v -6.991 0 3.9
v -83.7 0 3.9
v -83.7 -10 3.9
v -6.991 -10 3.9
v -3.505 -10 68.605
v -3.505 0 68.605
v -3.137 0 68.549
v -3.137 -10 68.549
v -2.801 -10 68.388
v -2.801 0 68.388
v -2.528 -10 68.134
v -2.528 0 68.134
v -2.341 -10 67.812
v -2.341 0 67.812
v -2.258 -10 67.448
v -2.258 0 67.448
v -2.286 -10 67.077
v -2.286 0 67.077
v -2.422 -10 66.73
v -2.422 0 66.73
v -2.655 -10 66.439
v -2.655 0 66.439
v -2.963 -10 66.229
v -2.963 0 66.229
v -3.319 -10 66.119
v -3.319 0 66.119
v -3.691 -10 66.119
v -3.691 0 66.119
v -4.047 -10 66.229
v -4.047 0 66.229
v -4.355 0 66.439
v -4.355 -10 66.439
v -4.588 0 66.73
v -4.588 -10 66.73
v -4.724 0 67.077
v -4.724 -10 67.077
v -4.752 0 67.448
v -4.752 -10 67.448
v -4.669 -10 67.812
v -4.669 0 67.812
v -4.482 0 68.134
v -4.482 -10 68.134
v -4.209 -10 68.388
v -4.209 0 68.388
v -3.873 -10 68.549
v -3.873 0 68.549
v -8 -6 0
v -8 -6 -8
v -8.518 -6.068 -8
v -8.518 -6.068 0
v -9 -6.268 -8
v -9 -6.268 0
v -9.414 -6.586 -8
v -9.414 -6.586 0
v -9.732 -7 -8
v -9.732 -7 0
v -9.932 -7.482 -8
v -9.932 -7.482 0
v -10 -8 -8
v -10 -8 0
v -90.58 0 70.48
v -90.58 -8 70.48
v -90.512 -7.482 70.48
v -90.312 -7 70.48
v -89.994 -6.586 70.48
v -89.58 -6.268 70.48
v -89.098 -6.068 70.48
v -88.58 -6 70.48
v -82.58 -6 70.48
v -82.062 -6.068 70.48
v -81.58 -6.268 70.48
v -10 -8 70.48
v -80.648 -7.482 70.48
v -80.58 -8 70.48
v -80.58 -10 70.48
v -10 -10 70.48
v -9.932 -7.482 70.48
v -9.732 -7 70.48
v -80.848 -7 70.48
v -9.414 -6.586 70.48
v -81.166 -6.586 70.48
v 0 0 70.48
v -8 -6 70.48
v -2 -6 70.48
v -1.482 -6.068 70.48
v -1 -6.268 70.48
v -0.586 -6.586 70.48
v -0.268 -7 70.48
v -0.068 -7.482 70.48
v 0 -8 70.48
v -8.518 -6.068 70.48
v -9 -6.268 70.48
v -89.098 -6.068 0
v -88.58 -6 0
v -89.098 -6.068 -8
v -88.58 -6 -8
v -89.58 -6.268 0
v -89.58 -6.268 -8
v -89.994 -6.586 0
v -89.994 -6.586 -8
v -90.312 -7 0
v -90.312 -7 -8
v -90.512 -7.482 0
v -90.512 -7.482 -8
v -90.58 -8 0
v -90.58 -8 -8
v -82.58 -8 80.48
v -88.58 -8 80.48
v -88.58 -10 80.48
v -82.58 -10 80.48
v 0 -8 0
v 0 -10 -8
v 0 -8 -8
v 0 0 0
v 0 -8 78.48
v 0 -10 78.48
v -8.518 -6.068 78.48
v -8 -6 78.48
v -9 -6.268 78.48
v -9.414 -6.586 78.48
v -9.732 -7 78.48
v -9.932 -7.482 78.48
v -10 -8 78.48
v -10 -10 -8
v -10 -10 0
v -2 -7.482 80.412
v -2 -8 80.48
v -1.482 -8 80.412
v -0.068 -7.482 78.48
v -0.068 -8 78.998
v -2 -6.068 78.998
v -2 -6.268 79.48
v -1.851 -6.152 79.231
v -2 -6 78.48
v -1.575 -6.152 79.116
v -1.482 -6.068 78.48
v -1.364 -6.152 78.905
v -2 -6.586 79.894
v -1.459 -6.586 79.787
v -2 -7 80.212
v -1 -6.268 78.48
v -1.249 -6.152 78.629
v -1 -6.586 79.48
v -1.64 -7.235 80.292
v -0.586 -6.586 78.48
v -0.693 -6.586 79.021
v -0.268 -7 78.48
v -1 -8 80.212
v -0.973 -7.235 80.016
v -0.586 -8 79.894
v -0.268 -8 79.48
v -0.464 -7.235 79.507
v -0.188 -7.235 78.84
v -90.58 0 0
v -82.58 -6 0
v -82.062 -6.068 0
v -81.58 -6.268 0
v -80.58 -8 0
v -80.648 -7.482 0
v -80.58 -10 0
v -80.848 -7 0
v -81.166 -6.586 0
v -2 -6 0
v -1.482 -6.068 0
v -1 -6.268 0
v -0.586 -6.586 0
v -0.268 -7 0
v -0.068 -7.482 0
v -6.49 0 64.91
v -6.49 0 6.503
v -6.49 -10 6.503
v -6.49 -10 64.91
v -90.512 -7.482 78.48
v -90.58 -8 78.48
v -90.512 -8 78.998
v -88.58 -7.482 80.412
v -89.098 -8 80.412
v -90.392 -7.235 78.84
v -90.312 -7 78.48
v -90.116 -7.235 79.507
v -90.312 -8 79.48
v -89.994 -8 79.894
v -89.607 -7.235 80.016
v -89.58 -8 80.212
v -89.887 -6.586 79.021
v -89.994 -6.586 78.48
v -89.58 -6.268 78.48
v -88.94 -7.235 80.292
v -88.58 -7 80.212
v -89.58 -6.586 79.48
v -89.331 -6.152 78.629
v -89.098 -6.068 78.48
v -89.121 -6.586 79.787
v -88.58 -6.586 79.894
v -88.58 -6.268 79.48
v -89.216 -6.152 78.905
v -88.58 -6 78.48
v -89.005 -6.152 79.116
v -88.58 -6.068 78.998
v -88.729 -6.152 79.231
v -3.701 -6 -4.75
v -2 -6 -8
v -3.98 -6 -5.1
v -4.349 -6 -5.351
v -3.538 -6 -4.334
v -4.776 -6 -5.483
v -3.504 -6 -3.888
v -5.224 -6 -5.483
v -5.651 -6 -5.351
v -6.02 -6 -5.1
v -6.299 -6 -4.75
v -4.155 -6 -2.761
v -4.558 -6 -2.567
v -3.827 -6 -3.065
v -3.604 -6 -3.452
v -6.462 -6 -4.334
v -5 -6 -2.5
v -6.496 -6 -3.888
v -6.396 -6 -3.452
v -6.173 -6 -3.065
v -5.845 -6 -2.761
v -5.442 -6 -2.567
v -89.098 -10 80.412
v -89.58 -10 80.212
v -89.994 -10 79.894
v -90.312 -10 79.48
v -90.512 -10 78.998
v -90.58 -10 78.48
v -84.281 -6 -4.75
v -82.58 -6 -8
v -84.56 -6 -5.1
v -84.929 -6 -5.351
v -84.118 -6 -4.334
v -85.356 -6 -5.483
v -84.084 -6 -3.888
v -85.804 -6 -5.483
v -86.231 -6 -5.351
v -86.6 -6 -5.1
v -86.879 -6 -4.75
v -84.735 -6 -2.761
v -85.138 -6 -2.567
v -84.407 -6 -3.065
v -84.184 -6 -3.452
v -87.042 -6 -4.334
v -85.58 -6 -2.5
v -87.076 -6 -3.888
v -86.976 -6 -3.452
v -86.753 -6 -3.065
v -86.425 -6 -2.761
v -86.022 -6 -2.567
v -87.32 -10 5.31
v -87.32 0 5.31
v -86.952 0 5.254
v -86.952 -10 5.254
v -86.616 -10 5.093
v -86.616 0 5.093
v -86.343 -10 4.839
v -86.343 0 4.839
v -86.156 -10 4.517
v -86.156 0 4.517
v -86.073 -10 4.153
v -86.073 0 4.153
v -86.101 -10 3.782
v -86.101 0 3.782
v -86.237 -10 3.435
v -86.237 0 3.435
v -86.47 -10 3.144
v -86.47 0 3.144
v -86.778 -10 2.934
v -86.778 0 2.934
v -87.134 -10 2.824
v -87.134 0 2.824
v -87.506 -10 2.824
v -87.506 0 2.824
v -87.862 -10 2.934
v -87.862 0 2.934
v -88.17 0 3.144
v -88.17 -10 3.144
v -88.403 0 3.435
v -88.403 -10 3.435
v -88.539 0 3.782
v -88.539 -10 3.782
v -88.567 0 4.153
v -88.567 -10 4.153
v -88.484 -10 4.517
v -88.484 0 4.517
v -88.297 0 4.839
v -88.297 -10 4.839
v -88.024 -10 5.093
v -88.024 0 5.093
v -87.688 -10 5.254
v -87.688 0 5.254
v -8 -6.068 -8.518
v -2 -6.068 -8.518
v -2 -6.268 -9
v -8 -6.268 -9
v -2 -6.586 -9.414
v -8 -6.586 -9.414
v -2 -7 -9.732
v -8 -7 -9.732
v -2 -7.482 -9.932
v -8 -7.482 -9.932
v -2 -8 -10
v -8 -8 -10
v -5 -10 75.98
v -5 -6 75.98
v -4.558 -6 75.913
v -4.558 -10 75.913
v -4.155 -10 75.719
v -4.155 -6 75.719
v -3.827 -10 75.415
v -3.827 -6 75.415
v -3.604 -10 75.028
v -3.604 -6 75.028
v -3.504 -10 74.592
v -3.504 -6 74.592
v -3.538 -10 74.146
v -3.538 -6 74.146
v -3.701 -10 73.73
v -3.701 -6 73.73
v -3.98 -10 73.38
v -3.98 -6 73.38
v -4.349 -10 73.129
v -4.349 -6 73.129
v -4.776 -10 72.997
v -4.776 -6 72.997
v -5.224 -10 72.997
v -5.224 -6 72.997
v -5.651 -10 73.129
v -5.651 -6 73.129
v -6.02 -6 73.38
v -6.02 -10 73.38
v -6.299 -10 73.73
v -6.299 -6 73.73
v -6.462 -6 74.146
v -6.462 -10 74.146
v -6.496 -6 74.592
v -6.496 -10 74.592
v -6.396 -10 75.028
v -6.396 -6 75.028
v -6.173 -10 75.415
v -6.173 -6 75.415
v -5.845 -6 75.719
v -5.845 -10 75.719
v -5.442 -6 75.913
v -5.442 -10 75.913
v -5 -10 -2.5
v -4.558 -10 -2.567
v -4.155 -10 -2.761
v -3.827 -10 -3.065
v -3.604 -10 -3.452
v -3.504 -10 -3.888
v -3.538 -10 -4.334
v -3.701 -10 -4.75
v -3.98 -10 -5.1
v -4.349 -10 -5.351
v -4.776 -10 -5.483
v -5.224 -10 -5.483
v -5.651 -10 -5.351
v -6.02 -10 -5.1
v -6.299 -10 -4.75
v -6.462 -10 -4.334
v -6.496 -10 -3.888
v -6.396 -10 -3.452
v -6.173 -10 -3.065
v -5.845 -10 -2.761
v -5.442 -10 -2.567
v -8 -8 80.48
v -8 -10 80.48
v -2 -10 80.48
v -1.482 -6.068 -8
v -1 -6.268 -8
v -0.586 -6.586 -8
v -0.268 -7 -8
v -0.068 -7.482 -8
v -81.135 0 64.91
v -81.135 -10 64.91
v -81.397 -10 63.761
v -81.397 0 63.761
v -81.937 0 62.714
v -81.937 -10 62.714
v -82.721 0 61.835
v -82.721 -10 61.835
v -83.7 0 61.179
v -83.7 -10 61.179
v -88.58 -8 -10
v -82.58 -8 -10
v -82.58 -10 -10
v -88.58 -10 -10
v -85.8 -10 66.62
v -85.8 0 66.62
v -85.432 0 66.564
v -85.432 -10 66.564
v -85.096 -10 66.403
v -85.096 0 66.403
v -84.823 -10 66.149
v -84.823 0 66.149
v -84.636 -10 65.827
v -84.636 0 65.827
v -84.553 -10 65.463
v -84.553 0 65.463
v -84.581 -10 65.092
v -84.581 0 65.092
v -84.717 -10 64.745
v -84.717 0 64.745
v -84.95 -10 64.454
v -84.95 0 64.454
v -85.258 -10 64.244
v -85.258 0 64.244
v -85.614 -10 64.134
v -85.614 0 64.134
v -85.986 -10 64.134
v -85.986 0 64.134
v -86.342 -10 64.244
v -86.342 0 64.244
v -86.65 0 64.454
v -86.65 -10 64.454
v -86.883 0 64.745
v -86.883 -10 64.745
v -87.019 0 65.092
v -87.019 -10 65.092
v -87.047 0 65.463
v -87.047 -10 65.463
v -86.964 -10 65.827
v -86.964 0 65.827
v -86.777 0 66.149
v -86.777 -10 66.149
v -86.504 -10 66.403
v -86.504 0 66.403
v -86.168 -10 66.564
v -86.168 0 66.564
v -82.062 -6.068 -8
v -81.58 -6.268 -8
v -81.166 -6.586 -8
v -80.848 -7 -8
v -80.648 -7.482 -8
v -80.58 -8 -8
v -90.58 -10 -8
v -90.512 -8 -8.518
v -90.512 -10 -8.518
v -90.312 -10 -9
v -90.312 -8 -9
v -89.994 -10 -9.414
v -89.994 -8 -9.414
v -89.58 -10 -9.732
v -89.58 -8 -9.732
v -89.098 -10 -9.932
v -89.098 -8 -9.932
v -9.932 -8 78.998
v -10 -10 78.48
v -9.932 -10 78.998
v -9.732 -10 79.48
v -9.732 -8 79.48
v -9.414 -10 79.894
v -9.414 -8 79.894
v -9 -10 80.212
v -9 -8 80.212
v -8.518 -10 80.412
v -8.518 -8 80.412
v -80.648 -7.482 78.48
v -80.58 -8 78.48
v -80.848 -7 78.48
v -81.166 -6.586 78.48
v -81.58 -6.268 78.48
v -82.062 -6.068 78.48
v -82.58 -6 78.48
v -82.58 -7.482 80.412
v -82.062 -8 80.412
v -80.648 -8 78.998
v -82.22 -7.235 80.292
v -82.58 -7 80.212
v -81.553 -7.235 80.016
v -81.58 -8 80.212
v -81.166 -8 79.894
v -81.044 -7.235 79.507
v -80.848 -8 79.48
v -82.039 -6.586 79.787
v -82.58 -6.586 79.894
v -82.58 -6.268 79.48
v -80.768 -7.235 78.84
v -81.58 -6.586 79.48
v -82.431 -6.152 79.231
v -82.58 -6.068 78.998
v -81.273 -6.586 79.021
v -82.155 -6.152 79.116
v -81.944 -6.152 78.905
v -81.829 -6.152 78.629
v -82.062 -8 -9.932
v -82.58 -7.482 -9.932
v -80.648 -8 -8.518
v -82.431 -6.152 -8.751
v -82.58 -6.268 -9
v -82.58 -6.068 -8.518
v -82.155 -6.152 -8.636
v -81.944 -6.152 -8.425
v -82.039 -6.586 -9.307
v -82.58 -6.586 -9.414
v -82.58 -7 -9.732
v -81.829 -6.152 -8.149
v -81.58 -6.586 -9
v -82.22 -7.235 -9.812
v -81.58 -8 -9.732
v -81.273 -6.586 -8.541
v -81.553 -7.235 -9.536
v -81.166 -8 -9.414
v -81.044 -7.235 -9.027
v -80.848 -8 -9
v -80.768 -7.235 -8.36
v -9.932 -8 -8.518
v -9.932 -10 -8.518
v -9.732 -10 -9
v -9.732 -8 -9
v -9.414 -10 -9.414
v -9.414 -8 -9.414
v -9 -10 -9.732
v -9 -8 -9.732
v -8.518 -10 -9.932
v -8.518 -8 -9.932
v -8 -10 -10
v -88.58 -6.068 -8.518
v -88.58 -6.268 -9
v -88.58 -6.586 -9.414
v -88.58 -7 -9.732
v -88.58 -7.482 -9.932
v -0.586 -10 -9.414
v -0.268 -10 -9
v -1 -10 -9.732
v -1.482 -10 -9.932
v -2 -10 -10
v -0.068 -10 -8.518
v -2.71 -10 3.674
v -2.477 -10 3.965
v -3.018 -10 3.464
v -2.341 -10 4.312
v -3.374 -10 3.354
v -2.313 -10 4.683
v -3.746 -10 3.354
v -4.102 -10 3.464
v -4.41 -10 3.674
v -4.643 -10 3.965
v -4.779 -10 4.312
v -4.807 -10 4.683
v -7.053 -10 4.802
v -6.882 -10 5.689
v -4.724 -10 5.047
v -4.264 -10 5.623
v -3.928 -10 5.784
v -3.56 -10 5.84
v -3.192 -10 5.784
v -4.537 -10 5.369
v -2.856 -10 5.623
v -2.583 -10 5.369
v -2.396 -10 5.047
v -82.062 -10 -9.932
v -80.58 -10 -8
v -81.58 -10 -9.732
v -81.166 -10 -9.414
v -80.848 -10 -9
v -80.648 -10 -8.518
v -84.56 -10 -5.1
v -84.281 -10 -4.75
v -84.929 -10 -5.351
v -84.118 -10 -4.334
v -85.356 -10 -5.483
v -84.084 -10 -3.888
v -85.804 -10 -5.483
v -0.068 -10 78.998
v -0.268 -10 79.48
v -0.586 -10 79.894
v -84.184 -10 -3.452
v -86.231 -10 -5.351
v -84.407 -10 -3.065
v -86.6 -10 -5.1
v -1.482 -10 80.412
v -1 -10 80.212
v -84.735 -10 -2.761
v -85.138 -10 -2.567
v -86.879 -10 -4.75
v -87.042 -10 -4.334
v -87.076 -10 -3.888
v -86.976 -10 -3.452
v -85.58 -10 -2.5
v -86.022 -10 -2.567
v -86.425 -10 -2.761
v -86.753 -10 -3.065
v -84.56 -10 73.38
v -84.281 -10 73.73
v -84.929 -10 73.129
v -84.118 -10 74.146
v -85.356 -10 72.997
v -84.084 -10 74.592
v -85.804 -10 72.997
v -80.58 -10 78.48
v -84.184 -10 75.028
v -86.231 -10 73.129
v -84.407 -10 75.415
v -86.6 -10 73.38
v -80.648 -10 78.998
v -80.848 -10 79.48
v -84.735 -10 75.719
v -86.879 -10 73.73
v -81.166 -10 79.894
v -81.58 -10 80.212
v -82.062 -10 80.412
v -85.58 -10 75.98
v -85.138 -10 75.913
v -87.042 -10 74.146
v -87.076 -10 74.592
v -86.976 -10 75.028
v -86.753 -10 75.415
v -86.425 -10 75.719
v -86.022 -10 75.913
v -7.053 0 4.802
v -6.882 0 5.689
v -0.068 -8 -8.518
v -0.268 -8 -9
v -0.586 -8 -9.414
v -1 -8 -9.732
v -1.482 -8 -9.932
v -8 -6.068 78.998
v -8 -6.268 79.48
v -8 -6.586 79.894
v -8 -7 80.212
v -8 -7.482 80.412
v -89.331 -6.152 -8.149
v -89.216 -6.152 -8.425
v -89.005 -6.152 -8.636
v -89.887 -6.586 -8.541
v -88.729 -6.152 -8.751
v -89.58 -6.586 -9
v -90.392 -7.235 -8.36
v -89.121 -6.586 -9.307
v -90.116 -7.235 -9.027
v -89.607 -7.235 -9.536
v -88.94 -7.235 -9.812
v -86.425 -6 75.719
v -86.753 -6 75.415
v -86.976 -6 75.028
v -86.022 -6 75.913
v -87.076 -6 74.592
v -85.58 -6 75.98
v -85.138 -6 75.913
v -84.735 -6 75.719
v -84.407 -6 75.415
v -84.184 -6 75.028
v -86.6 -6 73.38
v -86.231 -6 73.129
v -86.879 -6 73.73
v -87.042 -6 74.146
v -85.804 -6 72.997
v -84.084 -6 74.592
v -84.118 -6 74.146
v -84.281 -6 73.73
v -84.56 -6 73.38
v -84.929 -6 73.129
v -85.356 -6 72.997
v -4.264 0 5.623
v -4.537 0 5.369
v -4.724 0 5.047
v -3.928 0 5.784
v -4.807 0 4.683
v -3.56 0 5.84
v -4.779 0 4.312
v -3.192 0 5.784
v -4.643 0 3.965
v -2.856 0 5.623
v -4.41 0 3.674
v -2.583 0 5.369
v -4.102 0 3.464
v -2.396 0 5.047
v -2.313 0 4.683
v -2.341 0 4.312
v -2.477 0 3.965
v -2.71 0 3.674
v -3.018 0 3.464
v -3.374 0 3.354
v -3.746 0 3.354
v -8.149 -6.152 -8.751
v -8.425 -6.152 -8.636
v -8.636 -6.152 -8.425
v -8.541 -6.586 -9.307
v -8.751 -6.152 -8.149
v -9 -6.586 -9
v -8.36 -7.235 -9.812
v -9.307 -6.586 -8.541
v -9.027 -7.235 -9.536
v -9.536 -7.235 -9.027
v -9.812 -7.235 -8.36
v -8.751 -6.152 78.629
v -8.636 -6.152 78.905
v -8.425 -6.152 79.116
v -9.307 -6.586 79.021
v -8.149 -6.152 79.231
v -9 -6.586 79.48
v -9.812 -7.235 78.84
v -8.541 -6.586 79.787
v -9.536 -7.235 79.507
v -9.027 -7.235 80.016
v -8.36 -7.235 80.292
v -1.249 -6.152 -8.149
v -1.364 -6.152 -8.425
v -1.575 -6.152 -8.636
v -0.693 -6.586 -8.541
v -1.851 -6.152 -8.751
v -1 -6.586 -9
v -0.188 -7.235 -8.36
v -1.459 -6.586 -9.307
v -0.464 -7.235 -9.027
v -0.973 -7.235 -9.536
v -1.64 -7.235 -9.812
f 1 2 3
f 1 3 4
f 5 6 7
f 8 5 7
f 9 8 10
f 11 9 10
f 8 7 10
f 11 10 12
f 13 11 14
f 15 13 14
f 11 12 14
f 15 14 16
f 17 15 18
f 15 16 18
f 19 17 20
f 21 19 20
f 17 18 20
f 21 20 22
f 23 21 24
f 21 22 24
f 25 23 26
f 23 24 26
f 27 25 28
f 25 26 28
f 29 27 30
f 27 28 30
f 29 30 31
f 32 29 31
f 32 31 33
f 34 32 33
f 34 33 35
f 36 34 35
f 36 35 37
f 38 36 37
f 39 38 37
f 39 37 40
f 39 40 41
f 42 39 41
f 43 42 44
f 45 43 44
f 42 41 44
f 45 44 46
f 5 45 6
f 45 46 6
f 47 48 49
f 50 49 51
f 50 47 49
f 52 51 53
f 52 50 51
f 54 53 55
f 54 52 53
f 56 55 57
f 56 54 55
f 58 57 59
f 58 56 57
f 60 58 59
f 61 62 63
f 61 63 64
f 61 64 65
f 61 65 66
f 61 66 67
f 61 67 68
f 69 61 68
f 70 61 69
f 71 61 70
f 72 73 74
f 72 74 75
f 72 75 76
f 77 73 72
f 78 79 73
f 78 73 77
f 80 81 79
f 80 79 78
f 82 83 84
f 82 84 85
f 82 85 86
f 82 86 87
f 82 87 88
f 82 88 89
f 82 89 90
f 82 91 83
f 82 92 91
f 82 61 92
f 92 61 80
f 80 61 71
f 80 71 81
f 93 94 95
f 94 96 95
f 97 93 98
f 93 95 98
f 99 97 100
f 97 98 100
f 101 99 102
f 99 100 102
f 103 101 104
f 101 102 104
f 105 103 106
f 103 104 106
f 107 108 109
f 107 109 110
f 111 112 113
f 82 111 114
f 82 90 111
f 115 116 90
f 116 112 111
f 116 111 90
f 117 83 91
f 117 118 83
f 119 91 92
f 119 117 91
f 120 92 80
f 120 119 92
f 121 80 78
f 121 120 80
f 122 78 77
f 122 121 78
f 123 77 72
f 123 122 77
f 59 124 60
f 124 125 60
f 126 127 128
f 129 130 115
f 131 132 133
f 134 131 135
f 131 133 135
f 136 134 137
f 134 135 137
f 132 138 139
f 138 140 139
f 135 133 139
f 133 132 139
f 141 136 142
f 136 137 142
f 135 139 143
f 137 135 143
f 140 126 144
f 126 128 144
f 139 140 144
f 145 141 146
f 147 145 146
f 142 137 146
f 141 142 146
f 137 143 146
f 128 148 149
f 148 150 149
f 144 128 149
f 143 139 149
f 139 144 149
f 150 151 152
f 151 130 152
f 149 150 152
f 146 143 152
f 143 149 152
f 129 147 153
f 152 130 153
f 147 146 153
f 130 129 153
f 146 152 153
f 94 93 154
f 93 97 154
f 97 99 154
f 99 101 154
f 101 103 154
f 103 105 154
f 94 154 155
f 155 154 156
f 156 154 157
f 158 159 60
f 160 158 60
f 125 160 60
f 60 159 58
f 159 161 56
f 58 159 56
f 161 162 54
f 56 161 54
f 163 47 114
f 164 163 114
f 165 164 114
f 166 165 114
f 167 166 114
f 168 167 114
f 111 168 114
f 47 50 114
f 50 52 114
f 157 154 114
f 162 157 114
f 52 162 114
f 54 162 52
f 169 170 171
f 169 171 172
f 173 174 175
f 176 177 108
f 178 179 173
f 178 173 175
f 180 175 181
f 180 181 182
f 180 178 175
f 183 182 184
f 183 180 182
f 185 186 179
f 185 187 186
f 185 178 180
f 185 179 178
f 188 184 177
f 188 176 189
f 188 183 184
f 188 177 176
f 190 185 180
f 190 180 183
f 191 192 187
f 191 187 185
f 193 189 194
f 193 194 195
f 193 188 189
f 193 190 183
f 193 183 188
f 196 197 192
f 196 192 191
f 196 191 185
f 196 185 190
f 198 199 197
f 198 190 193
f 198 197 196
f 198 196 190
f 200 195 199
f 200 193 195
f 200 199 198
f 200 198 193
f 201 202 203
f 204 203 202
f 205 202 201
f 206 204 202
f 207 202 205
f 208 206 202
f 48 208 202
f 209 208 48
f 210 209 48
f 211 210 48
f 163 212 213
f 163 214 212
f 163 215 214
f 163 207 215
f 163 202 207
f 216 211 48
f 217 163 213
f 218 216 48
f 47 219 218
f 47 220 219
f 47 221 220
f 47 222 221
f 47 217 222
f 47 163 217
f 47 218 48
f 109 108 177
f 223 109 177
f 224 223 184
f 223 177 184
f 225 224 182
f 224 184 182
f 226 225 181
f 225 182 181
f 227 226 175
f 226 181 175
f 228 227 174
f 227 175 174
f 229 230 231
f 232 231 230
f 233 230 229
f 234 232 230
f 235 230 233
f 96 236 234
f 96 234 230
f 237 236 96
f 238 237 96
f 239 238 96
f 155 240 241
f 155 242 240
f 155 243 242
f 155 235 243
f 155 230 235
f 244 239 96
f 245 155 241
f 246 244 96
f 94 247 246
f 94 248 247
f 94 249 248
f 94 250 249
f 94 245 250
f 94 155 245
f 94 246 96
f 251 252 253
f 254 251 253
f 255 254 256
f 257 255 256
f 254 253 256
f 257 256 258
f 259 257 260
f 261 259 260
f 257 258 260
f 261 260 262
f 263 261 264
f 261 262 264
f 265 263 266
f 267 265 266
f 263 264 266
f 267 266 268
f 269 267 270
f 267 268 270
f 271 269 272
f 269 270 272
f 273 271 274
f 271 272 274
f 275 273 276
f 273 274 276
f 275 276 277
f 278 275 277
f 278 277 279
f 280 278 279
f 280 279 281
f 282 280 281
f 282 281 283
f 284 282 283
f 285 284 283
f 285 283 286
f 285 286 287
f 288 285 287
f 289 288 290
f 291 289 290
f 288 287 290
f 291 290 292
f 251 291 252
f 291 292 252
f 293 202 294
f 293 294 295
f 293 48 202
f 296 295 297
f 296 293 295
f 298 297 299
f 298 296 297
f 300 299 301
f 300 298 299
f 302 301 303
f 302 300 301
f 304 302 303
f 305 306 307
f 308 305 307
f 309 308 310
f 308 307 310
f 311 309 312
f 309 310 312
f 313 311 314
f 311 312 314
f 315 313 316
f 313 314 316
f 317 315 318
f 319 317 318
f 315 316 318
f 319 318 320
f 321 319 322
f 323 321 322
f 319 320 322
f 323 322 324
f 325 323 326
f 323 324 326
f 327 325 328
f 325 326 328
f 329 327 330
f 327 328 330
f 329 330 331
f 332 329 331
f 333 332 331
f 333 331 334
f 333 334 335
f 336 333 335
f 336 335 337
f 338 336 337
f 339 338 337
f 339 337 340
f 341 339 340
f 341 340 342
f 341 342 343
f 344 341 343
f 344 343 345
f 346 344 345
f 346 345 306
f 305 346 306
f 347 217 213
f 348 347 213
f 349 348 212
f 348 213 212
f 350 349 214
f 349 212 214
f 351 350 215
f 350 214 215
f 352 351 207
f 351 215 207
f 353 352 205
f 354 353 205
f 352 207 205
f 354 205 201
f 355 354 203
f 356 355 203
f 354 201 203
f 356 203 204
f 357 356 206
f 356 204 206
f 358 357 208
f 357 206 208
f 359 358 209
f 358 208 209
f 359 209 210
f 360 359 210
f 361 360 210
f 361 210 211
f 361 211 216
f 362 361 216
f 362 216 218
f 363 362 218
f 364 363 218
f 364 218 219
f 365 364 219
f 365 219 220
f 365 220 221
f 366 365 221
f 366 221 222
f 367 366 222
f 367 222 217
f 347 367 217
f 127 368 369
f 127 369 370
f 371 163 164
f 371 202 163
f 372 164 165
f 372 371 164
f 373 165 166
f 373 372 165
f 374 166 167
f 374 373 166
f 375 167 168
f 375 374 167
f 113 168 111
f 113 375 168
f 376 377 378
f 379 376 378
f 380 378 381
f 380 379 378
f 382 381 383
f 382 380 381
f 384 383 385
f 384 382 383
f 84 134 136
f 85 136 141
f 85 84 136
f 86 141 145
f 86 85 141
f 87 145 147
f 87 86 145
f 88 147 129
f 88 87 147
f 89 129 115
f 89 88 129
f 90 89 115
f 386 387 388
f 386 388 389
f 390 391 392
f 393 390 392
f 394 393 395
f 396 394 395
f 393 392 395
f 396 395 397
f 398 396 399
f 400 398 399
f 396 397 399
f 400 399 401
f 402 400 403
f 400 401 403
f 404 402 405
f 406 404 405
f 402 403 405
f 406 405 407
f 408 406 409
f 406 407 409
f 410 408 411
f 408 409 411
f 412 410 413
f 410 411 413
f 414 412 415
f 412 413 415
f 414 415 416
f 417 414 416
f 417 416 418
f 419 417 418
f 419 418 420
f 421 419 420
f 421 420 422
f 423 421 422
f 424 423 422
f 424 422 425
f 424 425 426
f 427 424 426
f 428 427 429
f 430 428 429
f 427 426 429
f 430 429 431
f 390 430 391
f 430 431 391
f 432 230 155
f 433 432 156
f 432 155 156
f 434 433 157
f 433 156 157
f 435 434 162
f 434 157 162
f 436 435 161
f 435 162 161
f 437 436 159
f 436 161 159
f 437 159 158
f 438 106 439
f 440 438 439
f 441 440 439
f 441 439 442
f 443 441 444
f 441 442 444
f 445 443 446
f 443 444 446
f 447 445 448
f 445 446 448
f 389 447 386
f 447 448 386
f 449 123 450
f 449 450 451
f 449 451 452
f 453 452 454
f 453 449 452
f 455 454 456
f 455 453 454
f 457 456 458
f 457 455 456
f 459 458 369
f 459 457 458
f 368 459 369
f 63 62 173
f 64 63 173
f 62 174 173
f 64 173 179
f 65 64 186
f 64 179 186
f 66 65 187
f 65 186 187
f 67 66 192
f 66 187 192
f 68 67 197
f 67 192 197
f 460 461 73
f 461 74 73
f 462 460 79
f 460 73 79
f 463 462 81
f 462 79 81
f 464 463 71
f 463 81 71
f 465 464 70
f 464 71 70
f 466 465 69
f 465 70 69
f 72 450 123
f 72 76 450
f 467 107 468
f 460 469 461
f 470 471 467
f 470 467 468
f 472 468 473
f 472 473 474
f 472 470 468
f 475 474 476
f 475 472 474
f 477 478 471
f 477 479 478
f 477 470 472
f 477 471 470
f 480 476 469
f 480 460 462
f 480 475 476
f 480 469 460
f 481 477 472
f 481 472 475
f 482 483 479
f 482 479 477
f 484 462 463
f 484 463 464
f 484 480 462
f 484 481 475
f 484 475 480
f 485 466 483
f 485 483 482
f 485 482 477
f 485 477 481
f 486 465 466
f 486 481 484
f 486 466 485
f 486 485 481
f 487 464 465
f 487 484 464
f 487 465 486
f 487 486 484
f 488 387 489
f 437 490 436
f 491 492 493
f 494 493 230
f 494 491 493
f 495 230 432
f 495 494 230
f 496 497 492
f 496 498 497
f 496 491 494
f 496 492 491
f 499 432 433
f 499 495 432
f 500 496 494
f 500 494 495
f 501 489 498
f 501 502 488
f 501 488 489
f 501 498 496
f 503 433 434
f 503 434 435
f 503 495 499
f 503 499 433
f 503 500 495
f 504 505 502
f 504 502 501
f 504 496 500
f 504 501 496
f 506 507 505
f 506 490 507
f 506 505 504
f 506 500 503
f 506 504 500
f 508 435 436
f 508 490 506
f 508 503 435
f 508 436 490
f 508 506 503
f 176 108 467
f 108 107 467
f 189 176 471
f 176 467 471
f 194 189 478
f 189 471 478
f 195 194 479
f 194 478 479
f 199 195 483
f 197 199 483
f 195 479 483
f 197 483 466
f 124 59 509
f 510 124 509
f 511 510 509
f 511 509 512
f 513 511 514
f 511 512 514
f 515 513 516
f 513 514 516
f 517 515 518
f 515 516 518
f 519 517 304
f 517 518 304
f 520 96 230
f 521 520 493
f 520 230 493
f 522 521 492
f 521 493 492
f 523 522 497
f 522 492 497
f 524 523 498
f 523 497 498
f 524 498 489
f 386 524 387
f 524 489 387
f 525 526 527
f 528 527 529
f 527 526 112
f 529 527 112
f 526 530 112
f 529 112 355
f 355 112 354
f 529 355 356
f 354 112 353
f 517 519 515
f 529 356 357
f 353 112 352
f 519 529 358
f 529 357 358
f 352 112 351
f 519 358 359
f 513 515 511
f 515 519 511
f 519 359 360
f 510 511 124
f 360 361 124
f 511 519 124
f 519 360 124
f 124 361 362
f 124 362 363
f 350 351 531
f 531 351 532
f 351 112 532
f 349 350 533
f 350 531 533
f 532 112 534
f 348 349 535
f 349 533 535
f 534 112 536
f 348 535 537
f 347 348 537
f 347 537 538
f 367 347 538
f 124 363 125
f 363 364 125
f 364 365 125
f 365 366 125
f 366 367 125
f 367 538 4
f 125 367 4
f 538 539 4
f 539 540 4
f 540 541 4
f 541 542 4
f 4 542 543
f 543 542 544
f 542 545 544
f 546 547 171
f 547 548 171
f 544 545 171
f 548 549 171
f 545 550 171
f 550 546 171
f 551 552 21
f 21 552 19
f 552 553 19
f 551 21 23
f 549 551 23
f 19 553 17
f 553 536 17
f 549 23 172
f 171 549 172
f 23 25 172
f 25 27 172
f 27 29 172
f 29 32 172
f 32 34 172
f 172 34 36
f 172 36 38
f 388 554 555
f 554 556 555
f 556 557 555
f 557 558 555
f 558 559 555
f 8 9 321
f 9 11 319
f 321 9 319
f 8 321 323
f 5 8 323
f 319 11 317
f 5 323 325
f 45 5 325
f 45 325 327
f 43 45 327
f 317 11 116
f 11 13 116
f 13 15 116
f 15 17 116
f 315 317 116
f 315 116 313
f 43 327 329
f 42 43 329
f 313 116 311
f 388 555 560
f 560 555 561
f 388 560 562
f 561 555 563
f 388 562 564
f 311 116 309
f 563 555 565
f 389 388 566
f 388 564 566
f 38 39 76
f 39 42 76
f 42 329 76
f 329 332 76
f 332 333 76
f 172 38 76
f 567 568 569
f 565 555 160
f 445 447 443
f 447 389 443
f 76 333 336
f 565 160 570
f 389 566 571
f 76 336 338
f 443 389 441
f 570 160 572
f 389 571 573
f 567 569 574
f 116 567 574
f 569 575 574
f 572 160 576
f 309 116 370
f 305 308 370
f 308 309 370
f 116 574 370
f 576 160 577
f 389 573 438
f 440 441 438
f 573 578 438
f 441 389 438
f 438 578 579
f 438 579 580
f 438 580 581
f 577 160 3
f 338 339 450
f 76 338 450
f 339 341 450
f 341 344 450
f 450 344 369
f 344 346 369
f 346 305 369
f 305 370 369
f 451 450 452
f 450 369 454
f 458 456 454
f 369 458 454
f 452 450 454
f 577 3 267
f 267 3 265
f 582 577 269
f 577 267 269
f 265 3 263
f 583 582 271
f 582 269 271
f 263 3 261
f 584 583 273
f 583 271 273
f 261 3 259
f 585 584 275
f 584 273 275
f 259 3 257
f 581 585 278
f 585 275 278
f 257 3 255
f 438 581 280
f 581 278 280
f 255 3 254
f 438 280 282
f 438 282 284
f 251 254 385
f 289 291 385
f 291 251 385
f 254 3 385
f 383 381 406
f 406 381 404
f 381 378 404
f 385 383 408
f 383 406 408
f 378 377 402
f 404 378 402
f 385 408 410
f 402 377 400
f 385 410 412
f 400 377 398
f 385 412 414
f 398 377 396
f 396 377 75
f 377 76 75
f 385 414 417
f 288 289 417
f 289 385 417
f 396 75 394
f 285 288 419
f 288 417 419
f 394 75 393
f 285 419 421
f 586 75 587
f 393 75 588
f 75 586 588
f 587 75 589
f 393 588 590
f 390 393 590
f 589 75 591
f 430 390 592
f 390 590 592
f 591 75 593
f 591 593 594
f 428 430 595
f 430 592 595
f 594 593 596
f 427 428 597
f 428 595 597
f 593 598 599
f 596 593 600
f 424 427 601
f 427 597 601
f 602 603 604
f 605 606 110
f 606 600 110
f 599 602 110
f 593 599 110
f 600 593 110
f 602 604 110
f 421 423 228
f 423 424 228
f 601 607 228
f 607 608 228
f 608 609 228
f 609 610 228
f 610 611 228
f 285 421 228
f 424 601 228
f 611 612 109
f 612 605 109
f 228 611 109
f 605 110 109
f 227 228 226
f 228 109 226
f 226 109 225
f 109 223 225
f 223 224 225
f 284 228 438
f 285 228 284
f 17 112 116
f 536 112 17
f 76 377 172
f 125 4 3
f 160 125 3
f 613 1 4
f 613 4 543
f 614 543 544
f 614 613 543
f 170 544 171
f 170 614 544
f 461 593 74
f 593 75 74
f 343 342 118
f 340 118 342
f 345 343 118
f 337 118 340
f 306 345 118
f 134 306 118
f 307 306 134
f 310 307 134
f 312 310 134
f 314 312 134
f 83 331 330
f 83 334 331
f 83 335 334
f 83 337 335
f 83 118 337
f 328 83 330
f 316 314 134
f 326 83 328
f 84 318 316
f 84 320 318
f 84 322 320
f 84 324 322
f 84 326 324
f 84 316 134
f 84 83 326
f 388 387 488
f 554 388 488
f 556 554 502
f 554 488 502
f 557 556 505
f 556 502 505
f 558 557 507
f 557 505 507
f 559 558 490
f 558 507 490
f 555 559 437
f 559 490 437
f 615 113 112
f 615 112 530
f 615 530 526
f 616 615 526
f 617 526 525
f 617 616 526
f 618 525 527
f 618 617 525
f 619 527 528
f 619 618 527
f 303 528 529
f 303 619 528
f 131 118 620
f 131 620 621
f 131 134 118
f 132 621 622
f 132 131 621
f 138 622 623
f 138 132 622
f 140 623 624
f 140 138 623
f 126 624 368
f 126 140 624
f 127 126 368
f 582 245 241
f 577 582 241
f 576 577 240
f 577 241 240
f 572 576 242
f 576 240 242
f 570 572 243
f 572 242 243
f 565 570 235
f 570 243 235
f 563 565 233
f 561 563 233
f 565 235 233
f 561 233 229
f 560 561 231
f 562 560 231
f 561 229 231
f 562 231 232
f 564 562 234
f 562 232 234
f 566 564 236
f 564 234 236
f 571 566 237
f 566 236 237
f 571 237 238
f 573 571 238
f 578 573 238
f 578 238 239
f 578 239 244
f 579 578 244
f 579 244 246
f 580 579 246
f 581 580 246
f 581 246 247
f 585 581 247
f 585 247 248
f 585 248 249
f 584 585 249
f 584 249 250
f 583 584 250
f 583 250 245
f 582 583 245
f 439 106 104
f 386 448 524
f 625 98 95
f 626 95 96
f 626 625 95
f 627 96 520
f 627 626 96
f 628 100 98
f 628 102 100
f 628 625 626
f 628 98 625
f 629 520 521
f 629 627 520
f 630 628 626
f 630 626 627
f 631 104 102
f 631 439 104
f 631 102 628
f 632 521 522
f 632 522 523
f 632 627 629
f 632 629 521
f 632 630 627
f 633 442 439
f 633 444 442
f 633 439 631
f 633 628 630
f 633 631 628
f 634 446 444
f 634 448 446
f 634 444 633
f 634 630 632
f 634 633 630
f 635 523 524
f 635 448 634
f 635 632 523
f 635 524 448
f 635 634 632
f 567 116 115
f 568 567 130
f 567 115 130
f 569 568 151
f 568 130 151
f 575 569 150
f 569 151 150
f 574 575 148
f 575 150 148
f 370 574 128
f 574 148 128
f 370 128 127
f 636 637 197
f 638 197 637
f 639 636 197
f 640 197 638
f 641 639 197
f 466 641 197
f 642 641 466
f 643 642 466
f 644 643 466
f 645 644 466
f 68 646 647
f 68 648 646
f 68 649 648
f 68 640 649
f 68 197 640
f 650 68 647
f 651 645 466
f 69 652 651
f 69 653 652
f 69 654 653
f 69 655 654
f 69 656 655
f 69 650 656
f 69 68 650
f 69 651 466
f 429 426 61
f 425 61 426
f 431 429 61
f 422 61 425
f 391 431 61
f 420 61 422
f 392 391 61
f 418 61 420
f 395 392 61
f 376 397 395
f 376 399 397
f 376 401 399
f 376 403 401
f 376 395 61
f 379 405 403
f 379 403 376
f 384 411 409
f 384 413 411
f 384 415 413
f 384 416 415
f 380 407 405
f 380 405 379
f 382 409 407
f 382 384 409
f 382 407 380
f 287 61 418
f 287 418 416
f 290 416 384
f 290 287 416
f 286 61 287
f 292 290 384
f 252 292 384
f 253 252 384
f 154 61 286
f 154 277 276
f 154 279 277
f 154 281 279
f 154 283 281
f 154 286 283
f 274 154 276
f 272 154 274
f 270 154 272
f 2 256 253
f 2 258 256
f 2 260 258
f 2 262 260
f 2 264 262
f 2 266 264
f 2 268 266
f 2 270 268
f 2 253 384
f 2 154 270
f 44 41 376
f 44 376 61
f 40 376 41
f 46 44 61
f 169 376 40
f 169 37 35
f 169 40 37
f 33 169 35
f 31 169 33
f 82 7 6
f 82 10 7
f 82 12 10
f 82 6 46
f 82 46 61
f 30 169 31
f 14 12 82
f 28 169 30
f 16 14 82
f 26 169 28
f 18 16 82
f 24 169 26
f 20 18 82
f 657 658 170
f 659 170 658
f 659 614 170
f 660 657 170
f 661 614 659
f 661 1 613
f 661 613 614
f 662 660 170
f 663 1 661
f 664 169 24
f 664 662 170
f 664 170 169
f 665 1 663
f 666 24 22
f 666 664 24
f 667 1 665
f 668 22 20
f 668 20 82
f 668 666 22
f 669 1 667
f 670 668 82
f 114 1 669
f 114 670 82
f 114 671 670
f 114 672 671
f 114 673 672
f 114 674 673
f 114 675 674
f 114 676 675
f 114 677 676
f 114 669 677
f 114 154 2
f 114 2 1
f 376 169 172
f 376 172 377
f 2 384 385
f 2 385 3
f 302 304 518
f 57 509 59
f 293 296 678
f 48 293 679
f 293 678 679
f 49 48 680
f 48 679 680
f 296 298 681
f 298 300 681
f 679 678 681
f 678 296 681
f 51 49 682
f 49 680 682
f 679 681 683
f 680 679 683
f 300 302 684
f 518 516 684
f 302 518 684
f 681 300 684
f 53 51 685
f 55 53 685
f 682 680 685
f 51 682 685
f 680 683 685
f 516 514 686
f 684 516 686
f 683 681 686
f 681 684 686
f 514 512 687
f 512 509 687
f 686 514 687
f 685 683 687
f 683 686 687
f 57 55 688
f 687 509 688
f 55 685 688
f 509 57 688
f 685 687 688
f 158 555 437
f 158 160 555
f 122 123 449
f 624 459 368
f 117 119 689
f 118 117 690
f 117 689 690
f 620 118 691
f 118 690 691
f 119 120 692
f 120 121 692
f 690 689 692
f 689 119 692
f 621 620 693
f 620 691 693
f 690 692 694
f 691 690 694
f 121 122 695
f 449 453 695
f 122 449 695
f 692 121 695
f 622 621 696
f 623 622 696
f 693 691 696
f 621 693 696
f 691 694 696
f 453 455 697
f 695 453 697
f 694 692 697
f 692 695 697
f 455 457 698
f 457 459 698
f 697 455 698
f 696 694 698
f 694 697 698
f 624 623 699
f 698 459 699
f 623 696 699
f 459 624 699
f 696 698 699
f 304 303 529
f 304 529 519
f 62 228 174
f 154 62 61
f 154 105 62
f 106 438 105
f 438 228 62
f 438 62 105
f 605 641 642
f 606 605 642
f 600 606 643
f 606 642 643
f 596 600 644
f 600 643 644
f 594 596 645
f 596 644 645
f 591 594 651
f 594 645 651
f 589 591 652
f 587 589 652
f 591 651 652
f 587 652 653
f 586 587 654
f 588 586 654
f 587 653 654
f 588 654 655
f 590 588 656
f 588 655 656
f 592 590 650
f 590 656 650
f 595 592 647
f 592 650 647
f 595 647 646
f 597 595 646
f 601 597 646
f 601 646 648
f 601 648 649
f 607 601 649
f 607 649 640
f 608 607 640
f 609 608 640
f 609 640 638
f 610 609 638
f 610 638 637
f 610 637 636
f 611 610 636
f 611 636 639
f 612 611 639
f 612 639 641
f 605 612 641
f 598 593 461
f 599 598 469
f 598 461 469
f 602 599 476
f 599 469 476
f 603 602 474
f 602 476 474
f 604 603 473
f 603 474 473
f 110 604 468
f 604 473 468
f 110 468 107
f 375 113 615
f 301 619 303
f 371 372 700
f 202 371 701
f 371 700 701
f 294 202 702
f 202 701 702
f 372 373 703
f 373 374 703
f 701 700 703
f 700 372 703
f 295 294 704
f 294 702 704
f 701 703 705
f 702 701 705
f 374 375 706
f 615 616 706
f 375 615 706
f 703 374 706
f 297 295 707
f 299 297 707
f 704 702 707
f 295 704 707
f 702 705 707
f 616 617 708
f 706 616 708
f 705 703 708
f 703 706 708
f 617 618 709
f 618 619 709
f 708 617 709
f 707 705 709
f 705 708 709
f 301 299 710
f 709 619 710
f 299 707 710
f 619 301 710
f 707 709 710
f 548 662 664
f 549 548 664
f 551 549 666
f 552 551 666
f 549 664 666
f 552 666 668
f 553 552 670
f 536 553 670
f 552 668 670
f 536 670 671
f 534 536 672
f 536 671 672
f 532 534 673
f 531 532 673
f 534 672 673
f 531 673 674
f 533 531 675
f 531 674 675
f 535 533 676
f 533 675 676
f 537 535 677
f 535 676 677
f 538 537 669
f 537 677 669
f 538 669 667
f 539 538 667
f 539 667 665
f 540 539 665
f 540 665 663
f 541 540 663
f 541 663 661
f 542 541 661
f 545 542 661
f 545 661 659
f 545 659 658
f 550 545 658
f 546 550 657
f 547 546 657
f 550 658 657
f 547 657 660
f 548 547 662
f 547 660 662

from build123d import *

# Parameters (mm, degrees)
SKETCH1_W           = 90.58
SKETCH1_H           = 70.48
SKETCH1_R           = 1.25
BOSS_EXTRUDE1_DEPTH = 10
SKETCH2_W           = 10
SKETCH2_H           = 4
BOSS_EXTRUDE2_DEPTH = 10
SKETCH3_W           = 10
SKETCH3_H           = 4
BOSS_EXTRUDE3_DEPTH = 10
FILLET2_R           = 2
FILLET3_R           = 2
CUT_EXTRUDE1_REACH  = 123.317
SKETCH4_R           = 1.5


with BuildPart() as part:
    # Sketch1 → Boss-Extrude1 (new body)
    with BuildSketch(Plane(origin=(0, 0, 0), x_dir=(1, 0, 0), z_dir=(0, 1, 0))):
        with Locations((-45.29, -35.24)):
            Rectangle(SKETCH1_W, SKETCH1_H)
        with Locations(Location((-3.505, -67.355, 0), (0, 0, 270))):
            Circle(SKETCH1_R, mode=Mode.SUBTRACT)
        with BuildLine():
            Line((-83.7, -61.178989341), (-83.7, -3.9))
            Line((-83.7, -3.9), (-6.990565569, -3.9))
            ThreePointArc((-6.990565569, -3.9), (-6.996312077, -5.25078698), (-6.49, -6.503107452))
            Line((-6.49, -6.503107452), (-6.49, -64.91))
            Line((-6.49, -64.91), (-81.134920114, -64.91))
            ThreePointArc((-81.134920114, -64.91), (-81.937140101, -62.714273406), (-83.7, -61.178989341))
        make_face(mode=Mode.SUBTRACT)
        with Locations(Location((-87.32, -4.06, 0), (0, 0, 270))):
            Circle(SKETCH1_R, mode=Mode.SUBTRACT)
        with Locations(Location((-3.56, -4.59, 0), (0, 0, 270))):
            Circle(SKETCH1_R, mode=Mode.SUBTRACT)
        with Locations(Location((-85.8, -65.37, 0), (0, 0, 270))):
            Circle(SKETCH1_R, mode=Mode.SUBTRACT)
    extrude(amount=-BOSS_EXTRUDE1_DEPTH)

    # Sketch2 → Boss-Extrude2 (add)
    with BuildSketch(Plane.XY.offset(70.48)):
        with Locations((-85.58, -8)):
            Rectangle(SKETCH2_W, SKETCH2_H)
        with Locations((-5, -8)):
            Rectangle(SKETCH2_W, SKETCH2_H)
    extrude(amount=BOSS_EXTRUDE2_DEPTH)

    # Sketch3 → Boss-Extrude3 (add)
    with BuildSketch(Plane(origin=(0, 0, 0), x_dir=(-1, 0, 0), z_dir=(0, 0, -1))):
        with Locations((5, -8)):
            Rectangle(SKETCH3_W, SKETCH3_H)
        with Locations((85.58, -8)):
            Rectangle(SKETCH3_W, SKETCH3_H)
    extrude(amount=BOSS_EXTRUDE3_DEPTH)

    # Fillet2
    fillet2_edges = [part.edges().sort_by_distance(p)[0] for p in [
        (-90.58, -8, 80.48),
        (-80.58, -8, 80.48),
        (0, -8, 80.48),
        (-10, -8, 80.48),
        (0, -8, -10),
        (-10, -8, -10),
        (-90.58, -8, -10),
        (-80.58, -8, -10),
    ]]
    fillet(fillet2_edges, radius=FILLET2_R)

    # Fillet3
    fillet3_edges = [part.edges().sort_by_distance(p)[0] for p in [
        (-85.58, -6, 80.48),
        (-90.58, -6, 74.48),
        (-80.58, -6, 74.48),
        (-89.994213562, -6, 79.894213562),
        (-81.165786438, -6, 79.894213562),
        (-90.58, -6, -4),
        (-85.58, -6, -10),
        (-80.58, -6, -4),
        (-81.165786438, -6, -9.414213562),
        (-89.994213562, -6, -9.414213562),
        (-5, -6, -10),
        (-10, -6, -4),
        (-9.414213562, -6, -9.414213562),
        (-0.585786438, -6, -9.414213562),
        (-5, -6, 80.48),
        (-10, -6, 74.48),
        (0, -6, 74.48),
        (-9.414213562, -6, 79.894213562),
        (-0.585786438, -6, 79.894213562),
        (0, -6, -4),
    ]]
    fillet(fillet3_edges, radius=FILLET3_R)

    # Sketch4 → Cut-Extrude1 (cut, up to next)
    with BuildSketch(Plane(origin=(0, -6, 0), x_dir=(1, 0, 0), z_dir=(0, 1, 0)), mode=Mode.PRIVATE) as cut_extrude1_sk1:
        with Locations(Location((-5, 4, 0), (0, 0, 270))):
            Circle(SKETCH4_R)
    cut_extrude1_tool1 = extrude(cut_extrude1_sk1.sketch, amount=-CUT_EXTRUDE1_REACH, mode=Mode.PRIVATE) & part.part
    # Sketch4 → Cut-Extrude1 (cut, up to next)
    with BuildSketch(Plane(origin=(0, -6, 0), x_dir=(1, 0, 0), z_dir=(0, 1, 0)), mode=Mode.PRIVATE) as cut_extrude1_sk2:
        with Locations(Location((-5, -74.48, 0), (0, 0, 270))):
            Circle(SKETCH4_R)
    cut_extrude1_tool2 = extrude(cut_extrude1_sk2.sketch, amount=-CUT_EXTRUDE1_REACH, mode=Mode.PRIVATE) & part.part
    # Sketch4 → Cut-Extrude1 (cut, up to next)
    with BuildSketch(Plane(origin=(0, -6, 0), x_dir=(1, 0, 0), z_dir=(0, 1, 0)), mode=Mode.PRIVATE) as cut_extrude1_sk3:
        with Locations(Location((-85.58, -74.48, 0), (0, 0, 270))):
            Circle(SKETCH4_R)
    cut_extrude1_tool3 = extrude(cut_extrude1_sk3.sketch, amount=-CUT_EXTRUDE1_REACH, mode=Mode.PRIVATE) & part.part
    # Sketch4 → Cut-Extrude1 (cut, up to next)
    with BuildSketch(Plane(origin=(0, -6, 0), x_dir=(1, 0, 0), z_dir=(0, 1, 0)), mode=Mode.PRIVATE) as cut_extrude1_sk4:
        with Locations(Location((-85.58, 4, 0), (0, 0, 270))):
            Circle(SKETCH4_R)
    cut_extrude1_tool4 = extrude(cut_extrude1_sk4.sketch, amount=-CUT_EXTRUDE1_REACH, mode=Mode.PRIVATE) & part.part
    add(cut_extrude1_tool1.solids().sort_by_distance((-5, -6, -4))[0], mode=Mode.SUBTRACT)
    add(cut_extrude1_tool2.solids().sort_by_distance((-5, -6, 74.48))[0], mode=Mode.SUBTRACT)
    add(cut_extrude1_tool3.solids().sort_by_distance((-85.58, -6, 74.48))[0], mode=Mode.SUBTRACT)
    add(cut_extrude1_tool4.solids().sort_by_distance((-85.58, -6, -4))[0], mode=Mode.SUBTRACT)


solid = part.part
